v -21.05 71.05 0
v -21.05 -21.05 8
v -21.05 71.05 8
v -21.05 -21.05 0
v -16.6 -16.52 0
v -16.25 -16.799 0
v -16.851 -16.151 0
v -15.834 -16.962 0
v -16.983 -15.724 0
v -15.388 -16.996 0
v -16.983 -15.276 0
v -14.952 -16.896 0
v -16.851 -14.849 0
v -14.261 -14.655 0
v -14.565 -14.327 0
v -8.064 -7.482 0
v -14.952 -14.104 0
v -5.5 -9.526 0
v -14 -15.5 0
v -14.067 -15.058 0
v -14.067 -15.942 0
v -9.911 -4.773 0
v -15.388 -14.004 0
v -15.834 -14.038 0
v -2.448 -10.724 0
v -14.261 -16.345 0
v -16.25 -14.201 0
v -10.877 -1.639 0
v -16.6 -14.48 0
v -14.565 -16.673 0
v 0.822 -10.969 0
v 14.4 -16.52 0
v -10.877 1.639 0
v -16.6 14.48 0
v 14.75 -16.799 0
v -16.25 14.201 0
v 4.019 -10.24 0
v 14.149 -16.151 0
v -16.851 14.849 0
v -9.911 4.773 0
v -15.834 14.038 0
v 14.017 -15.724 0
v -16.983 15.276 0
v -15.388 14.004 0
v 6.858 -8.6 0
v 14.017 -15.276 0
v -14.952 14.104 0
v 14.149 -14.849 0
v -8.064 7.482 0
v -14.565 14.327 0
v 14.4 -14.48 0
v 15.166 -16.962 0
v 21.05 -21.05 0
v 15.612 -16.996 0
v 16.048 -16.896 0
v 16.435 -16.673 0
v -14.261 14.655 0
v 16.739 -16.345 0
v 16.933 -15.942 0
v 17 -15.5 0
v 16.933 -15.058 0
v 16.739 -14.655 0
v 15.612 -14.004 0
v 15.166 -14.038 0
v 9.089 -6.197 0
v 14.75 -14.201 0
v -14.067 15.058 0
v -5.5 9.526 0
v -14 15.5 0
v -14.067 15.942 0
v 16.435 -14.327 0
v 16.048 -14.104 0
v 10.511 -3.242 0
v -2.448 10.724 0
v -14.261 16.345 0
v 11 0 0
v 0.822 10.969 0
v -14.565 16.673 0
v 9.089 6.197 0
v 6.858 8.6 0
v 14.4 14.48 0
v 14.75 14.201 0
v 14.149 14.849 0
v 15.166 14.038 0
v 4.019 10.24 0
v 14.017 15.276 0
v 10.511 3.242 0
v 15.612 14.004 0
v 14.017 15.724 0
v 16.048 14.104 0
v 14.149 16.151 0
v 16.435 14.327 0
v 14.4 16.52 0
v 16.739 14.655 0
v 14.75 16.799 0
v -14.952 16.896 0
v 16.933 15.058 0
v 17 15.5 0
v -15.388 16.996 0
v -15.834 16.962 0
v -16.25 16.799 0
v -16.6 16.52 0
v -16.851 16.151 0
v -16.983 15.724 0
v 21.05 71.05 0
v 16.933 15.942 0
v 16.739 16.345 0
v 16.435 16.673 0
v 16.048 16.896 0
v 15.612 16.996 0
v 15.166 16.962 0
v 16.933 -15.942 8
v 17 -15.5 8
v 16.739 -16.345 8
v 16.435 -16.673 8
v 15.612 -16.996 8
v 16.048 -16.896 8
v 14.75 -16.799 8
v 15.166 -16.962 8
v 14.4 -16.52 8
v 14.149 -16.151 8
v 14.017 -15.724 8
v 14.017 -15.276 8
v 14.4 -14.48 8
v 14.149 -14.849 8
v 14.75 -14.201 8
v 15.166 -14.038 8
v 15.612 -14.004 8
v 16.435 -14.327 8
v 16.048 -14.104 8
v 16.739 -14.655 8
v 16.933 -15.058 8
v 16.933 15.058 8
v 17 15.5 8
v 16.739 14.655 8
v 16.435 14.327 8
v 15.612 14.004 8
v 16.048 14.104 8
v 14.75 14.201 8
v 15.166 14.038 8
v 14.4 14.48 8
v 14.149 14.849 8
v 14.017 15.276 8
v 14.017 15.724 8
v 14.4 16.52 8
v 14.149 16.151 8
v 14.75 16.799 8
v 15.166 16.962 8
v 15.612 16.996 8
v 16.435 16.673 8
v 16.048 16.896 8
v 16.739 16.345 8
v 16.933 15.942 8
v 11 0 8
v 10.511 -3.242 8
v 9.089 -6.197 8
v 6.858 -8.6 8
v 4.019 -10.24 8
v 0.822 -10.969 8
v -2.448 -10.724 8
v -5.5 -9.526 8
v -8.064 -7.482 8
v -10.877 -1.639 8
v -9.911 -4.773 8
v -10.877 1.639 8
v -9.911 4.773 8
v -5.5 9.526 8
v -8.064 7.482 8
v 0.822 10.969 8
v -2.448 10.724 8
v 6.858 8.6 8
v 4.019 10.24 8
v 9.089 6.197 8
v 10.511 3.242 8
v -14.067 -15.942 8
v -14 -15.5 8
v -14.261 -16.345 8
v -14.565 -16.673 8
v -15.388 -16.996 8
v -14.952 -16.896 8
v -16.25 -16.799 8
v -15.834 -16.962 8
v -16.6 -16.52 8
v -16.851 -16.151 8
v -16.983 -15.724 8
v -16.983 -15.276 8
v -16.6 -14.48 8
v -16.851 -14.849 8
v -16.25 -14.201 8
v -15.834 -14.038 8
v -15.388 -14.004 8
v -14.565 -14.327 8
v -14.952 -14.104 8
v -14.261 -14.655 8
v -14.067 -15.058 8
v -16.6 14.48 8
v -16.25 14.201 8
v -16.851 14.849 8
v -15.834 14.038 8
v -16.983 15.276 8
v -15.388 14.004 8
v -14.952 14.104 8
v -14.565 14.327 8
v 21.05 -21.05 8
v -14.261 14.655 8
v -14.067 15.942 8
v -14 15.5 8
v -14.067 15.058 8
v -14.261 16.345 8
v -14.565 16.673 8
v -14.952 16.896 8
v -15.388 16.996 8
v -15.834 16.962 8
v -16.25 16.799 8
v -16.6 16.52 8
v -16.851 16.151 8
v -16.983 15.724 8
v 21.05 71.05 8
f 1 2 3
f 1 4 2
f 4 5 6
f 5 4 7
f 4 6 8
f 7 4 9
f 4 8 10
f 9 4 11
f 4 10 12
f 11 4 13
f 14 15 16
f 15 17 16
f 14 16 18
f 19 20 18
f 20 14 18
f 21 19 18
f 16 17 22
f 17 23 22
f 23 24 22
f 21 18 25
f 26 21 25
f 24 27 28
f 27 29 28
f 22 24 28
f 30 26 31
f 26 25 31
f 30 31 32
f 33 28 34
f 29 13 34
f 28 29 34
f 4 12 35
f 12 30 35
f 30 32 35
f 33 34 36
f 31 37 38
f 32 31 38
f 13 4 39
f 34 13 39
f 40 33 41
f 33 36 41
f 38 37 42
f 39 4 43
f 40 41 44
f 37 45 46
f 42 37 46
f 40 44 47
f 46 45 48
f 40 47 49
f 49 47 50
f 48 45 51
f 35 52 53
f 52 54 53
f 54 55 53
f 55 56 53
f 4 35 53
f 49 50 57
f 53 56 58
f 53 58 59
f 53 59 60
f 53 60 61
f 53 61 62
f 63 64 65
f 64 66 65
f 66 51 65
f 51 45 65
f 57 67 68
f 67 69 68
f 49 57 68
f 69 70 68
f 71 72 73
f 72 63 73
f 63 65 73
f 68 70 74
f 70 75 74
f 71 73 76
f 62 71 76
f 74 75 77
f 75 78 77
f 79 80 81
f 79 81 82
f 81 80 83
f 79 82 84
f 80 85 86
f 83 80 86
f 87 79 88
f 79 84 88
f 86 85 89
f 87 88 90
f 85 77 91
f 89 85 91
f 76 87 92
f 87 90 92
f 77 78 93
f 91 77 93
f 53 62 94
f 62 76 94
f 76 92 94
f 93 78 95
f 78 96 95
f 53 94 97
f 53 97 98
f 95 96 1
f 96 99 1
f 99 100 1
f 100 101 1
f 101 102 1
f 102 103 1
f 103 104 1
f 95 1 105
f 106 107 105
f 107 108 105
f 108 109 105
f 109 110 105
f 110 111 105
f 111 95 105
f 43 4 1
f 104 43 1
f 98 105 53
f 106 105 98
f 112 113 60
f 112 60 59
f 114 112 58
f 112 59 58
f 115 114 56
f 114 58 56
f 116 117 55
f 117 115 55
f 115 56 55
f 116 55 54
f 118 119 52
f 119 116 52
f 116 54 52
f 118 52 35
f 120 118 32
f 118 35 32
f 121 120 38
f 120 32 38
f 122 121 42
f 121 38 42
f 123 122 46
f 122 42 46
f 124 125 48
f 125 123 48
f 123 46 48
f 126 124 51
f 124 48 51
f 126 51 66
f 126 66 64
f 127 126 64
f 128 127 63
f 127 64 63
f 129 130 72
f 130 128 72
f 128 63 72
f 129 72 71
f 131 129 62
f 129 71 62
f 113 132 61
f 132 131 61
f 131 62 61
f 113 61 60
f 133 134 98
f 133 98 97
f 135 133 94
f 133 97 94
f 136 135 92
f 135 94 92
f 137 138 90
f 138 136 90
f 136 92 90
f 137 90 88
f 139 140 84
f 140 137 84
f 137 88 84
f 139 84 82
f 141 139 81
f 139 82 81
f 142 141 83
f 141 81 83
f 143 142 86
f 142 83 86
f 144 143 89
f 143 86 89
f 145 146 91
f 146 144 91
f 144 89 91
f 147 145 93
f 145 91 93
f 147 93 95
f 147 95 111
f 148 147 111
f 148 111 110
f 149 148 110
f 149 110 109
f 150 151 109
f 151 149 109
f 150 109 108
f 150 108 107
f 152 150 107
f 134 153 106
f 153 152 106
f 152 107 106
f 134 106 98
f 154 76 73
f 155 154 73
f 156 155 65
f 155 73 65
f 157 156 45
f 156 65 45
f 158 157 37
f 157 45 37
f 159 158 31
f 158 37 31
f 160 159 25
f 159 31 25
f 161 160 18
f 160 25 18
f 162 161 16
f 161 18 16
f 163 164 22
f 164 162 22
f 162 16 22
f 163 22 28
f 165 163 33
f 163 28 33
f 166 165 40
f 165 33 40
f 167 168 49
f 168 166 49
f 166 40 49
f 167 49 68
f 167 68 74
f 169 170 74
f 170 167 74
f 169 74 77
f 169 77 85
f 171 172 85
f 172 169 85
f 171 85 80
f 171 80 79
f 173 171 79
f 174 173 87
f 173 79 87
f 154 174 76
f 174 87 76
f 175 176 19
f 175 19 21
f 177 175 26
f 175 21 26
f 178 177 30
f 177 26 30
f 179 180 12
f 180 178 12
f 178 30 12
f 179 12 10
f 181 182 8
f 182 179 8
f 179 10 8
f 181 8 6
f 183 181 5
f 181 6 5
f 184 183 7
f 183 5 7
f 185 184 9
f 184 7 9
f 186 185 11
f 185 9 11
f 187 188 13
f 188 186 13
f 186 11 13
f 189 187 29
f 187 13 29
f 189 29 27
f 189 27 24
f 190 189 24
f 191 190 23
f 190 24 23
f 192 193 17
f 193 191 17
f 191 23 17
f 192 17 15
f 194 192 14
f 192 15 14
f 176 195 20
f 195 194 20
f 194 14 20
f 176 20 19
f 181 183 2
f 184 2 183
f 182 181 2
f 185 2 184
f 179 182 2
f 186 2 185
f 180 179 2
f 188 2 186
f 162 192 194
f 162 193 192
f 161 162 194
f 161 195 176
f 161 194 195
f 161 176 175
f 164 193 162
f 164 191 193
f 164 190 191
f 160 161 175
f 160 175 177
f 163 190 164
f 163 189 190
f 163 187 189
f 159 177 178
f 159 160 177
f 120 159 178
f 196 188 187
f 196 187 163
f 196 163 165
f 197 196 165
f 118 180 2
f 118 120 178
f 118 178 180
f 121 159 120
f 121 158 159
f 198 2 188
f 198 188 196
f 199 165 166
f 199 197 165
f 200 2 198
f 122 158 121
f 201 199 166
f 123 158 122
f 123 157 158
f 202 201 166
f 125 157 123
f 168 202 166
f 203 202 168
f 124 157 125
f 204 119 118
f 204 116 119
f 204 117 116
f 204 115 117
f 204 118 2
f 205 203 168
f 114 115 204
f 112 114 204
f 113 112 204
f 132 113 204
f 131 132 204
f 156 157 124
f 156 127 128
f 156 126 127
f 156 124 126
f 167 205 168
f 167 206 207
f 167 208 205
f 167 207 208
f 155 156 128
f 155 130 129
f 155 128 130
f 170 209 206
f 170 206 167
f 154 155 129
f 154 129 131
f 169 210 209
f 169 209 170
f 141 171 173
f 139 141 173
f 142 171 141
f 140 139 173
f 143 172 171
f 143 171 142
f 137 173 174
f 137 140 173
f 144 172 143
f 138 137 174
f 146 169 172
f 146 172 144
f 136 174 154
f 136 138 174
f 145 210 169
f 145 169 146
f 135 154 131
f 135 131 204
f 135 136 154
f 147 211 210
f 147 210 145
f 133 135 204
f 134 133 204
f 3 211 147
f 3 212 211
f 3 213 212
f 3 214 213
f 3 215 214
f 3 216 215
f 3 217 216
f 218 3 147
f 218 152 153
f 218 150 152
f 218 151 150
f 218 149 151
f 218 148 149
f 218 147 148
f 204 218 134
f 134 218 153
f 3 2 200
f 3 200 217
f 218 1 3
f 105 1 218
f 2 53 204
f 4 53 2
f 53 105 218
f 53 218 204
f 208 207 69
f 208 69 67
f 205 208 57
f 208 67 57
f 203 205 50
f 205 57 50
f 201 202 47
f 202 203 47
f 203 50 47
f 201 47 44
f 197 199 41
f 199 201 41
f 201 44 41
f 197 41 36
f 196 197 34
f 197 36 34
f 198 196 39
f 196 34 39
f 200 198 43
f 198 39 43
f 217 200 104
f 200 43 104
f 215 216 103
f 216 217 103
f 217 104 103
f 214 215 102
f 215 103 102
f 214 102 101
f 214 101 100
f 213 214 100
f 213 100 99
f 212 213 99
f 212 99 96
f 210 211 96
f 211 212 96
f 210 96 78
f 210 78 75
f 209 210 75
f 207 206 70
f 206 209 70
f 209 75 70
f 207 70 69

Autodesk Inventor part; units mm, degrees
ref_plane "YZ Plane" through (0, 0, 0) normal (1, 0, 0) x (0, 1, 0)
ref_plane "XZ Plane" through (0, 0, 0) normal (0, 1, 0) x (-1, 0, 0)
ref_plane "XY Plane" through (0, 0, 0) normal (0, 0, 1) x (1, 0, 0)
sketch "Sketch1" plane through (0, 0, 0) normal (0, 0, 1) x (1, 0, 0)
  circle A0 centre (0, 0) radius 11 projected
  circle A1 centre (-15.5, 15.5) radius 1.5 projected
  circle A2 centre (15.5, 15.5) radius 1.5 projected
  circle A3 centre (-15.5, -15.5) radius 1.5 projected
  circle A4 centre (15.5, -15.5) radius 1.5 projected
  line L0 (21.05, -21.05) -> (-21.05, -21.05)
  line L1 (21.05, 21.05) -> (21.05, -21.05)
  line L2 (-21.05, 21.05) -> (21.05, 21.05)
  line L3 (-21.05, -21.05) -> (-21.05, 21.05)
  point P0 (0, 0)
extrude "Extrusion1" add sketch "Sketch1" along normal blind 8
sketch "Sketch2" plane through (-21.05, 21.05, 0) normal (0, 1, 0) x (1, 0, 0)
  line L0 (42.1, 0) -> (0, 0) projected
  line L1 (0, 0) -> (0, -8) projected
  line L2 (42.1, -8) -> (0, -8) projected
  line L3 (42.1, 0) -> (42.1, -8) projected
  point P0 (21.05, 0)
extrude "Extrusion2" add sketch "Sketch2" along normal blind 50
properties part number "nema17 x plate"
